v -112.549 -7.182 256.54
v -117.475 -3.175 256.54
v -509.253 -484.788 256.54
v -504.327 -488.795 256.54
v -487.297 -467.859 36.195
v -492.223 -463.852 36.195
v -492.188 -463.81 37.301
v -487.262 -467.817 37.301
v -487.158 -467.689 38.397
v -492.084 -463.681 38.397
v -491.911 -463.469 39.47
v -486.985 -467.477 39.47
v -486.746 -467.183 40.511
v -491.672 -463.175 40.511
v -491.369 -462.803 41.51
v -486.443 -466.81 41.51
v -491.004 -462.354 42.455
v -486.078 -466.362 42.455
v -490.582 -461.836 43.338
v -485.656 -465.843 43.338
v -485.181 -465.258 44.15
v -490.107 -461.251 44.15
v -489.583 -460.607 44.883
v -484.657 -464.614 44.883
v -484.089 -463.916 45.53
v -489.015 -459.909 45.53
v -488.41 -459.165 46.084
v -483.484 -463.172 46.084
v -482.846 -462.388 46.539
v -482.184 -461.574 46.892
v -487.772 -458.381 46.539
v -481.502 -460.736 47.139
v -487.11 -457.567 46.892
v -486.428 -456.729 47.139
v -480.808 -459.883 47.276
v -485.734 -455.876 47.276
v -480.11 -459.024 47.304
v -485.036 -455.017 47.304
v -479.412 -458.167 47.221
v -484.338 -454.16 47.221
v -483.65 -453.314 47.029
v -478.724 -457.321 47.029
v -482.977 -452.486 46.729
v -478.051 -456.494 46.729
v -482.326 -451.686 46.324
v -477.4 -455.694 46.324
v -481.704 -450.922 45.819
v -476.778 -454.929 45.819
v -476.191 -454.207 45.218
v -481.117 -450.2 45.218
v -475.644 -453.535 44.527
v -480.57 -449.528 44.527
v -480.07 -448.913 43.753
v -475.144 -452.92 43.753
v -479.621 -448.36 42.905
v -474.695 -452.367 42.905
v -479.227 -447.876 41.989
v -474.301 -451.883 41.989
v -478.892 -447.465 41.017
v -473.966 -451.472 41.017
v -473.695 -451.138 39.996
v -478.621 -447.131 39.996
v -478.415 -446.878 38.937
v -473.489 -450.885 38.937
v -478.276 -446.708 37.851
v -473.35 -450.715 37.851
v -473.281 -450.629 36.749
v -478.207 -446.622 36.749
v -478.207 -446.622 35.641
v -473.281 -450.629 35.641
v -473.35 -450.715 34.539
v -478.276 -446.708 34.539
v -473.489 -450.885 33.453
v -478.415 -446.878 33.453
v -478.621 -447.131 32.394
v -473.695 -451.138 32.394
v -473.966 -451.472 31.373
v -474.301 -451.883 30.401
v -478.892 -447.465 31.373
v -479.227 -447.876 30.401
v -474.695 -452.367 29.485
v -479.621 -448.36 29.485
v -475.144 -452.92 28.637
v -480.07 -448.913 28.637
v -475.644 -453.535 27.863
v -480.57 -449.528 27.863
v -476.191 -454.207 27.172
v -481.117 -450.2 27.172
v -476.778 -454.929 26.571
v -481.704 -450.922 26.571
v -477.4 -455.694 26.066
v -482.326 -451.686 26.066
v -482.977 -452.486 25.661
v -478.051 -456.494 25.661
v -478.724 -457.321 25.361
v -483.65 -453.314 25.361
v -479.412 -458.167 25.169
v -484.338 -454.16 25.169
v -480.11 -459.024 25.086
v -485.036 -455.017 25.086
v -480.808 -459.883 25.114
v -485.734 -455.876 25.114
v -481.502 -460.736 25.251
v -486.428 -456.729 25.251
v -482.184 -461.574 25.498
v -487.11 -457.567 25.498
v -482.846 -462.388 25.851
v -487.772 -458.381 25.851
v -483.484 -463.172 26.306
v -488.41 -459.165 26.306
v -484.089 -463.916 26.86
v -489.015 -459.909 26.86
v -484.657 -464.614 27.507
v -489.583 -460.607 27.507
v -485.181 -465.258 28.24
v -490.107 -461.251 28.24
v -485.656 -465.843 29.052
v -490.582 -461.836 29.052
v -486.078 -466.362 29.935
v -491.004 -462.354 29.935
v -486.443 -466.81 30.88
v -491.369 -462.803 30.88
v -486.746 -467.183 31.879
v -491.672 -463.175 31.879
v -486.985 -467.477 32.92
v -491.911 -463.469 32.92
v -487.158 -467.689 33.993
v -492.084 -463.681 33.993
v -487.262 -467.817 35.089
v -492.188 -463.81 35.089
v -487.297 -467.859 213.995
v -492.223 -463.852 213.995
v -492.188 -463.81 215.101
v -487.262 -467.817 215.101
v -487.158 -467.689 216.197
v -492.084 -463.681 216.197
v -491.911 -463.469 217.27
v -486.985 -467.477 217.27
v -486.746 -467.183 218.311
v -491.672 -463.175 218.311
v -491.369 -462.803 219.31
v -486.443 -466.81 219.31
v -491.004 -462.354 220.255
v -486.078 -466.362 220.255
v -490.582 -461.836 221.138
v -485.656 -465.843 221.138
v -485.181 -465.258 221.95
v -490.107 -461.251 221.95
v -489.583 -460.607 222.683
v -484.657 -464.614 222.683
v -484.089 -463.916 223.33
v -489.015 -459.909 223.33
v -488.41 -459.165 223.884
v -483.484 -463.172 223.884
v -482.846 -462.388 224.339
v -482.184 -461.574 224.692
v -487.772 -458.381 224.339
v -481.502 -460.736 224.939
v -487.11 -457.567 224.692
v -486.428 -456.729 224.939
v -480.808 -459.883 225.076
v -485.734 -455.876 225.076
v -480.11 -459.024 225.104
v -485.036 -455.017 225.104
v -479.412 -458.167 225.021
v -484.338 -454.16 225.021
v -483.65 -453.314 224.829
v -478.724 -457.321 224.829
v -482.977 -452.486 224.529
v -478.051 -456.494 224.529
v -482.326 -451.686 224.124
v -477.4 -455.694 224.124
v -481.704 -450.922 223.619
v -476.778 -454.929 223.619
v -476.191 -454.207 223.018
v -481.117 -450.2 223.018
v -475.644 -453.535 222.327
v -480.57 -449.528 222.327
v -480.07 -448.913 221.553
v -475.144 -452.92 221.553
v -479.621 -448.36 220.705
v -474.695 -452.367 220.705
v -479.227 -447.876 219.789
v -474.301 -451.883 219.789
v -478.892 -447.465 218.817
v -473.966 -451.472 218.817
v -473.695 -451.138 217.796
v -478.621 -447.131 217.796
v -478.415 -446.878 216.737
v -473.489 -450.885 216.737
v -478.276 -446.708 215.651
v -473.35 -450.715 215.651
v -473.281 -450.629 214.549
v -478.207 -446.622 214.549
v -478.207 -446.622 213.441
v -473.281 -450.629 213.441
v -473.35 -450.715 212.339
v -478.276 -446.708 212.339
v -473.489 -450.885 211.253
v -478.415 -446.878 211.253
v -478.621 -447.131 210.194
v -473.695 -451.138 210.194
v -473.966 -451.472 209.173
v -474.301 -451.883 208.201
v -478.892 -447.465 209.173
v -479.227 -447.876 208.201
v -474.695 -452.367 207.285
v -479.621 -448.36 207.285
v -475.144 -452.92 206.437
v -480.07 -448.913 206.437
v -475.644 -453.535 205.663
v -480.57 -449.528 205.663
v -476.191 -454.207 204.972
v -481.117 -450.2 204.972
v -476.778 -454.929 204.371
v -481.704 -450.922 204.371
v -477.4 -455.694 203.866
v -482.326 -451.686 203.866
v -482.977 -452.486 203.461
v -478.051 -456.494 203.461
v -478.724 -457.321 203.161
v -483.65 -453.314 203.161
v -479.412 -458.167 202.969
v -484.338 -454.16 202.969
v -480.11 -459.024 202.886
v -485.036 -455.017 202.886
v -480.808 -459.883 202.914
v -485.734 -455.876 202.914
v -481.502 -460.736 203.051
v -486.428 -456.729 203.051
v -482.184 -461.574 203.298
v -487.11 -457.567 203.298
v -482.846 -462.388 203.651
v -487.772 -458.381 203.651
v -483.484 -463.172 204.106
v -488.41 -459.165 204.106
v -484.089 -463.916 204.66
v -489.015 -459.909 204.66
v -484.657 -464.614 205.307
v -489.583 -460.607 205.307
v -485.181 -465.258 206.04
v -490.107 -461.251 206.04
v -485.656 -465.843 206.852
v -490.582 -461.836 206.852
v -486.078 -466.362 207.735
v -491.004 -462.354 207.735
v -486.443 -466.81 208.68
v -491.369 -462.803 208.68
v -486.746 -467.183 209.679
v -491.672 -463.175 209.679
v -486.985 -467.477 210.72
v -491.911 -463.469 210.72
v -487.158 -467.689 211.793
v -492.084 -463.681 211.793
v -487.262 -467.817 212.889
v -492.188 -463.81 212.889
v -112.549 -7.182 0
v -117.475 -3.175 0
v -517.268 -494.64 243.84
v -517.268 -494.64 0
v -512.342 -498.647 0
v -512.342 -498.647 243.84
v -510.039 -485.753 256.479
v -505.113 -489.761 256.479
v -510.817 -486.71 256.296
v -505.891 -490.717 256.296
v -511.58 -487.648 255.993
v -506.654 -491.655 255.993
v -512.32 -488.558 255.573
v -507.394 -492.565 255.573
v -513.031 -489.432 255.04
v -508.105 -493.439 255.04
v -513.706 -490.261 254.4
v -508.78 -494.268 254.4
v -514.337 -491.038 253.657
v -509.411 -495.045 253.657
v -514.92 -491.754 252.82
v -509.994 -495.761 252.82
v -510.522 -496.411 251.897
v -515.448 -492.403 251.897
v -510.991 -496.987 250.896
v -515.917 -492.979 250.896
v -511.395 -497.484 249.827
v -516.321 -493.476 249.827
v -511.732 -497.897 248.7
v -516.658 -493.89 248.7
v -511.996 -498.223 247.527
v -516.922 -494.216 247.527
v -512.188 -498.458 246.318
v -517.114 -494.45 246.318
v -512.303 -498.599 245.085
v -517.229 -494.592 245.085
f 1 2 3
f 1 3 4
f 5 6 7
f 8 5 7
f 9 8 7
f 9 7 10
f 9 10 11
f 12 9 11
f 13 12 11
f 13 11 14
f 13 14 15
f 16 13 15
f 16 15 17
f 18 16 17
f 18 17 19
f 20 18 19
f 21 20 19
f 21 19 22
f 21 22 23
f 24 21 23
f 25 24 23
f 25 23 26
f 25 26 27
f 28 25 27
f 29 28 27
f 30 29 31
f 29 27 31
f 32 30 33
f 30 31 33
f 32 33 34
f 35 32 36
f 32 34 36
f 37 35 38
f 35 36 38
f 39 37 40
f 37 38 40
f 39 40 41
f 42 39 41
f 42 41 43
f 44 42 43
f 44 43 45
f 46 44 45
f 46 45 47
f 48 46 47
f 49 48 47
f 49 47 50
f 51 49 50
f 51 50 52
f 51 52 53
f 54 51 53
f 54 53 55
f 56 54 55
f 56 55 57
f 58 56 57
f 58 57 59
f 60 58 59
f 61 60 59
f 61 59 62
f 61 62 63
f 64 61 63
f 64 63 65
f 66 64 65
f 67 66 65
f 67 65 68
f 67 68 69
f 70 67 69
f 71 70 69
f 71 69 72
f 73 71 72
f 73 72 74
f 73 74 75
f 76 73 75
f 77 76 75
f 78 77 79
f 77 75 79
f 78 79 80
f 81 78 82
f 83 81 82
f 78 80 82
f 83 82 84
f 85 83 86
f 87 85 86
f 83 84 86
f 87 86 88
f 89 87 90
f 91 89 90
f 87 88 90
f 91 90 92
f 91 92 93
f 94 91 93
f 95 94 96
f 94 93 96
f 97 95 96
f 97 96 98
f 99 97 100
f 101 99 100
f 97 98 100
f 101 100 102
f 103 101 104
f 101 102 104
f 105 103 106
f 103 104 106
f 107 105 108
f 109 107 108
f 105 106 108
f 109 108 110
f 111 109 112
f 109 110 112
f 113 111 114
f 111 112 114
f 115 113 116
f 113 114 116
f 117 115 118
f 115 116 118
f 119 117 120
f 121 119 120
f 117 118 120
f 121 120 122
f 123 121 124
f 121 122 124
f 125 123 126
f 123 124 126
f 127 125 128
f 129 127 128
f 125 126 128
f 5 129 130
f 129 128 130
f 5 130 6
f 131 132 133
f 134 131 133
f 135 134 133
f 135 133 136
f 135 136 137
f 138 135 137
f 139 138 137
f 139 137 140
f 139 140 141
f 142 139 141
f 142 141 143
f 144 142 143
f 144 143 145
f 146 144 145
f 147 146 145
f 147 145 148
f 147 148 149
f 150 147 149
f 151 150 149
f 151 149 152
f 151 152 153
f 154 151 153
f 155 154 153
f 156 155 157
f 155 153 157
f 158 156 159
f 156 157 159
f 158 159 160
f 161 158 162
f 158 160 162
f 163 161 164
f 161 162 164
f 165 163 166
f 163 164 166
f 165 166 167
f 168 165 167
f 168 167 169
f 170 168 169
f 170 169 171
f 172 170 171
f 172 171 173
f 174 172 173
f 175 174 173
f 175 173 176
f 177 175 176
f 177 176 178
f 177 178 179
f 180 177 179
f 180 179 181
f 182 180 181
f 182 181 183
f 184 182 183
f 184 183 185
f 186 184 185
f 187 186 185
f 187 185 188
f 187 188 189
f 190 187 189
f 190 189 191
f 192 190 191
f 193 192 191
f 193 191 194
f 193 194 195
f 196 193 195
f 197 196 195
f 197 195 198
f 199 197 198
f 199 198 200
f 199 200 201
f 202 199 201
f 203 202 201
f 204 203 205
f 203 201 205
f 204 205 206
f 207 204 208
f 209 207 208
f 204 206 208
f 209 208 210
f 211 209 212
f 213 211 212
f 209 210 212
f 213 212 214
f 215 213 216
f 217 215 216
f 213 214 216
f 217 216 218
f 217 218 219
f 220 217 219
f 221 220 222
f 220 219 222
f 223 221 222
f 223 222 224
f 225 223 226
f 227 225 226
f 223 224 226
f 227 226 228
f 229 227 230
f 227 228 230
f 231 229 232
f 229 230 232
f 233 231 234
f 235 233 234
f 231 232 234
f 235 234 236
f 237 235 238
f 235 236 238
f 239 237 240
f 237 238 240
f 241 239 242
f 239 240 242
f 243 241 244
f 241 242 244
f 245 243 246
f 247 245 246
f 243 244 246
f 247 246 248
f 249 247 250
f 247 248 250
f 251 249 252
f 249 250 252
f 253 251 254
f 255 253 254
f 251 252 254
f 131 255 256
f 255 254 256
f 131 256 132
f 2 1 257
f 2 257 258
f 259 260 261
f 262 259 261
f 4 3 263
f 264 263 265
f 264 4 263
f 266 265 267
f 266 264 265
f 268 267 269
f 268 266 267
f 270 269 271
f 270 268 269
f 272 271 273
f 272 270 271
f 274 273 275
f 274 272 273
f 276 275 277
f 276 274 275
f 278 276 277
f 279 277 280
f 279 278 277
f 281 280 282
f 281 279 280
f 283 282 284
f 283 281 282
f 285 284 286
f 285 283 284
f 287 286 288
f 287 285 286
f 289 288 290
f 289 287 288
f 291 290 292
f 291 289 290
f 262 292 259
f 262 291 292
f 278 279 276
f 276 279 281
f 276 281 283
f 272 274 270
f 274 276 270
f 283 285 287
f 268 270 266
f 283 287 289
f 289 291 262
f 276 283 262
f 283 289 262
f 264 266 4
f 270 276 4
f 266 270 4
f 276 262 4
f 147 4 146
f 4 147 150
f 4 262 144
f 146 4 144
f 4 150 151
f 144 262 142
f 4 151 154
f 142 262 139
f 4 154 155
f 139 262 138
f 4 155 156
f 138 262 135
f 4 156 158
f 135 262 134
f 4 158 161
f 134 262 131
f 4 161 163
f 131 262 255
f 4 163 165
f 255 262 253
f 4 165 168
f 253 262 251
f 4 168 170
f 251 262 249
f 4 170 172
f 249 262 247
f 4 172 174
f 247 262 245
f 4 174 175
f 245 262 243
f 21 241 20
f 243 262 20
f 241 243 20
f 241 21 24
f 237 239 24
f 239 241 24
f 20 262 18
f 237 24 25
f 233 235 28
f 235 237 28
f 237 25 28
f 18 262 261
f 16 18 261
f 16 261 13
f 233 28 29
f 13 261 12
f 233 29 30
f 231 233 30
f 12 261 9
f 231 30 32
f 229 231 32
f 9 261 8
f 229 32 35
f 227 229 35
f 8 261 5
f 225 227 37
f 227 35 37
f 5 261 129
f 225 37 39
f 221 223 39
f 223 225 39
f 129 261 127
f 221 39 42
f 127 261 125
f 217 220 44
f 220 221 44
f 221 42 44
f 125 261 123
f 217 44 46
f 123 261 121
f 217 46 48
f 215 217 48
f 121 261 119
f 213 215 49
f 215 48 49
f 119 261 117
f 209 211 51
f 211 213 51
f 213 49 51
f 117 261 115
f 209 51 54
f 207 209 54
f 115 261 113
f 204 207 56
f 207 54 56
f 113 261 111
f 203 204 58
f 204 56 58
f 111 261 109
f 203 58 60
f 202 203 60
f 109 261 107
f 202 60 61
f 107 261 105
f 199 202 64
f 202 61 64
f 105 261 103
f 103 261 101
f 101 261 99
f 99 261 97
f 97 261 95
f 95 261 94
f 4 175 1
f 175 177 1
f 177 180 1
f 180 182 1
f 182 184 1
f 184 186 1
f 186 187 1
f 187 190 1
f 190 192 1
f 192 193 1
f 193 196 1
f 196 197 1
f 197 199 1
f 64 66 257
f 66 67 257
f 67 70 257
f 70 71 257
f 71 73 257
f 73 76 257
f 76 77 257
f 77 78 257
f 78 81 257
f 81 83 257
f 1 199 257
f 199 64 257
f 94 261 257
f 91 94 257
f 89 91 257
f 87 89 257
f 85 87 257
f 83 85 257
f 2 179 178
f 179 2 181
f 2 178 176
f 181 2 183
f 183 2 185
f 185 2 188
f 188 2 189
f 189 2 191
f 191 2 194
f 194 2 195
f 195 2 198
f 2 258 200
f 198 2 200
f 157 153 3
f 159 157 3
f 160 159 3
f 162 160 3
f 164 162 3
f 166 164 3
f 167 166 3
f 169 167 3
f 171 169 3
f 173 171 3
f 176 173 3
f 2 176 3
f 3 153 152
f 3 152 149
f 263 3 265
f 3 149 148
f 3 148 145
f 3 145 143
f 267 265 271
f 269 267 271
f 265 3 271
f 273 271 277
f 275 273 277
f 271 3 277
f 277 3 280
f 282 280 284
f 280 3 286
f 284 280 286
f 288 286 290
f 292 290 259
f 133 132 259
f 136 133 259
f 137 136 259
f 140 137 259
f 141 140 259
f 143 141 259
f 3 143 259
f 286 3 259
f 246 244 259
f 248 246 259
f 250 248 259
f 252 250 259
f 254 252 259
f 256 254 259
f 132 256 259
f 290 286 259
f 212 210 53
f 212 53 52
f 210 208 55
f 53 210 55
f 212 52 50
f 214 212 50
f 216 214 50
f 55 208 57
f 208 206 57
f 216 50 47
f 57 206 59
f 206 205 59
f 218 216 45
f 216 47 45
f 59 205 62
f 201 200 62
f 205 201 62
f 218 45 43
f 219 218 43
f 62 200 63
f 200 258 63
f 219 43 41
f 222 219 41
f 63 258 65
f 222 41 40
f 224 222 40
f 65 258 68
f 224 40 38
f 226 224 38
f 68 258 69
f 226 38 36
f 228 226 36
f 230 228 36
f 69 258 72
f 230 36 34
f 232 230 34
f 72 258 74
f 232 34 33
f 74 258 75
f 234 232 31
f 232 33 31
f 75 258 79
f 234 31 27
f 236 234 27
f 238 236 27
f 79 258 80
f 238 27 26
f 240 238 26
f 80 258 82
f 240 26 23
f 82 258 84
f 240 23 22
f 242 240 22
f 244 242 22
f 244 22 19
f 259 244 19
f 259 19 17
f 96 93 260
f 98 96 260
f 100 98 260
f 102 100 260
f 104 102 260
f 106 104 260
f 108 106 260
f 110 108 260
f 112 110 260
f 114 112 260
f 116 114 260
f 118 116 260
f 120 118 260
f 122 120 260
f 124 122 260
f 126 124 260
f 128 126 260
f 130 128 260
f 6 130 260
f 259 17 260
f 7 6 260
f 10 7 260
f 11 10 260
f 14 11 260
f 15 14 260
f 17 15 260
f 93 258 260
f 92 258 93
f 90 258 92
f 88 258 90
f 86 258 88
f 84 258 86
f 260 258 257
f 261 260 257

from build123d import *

# Parameters (mm, degrees)
BOSS_EXTRUDE1_DEPTH = 256.54
CUT_EXTRUDE1_REACH  = 759.98
SKETCH2_R           = 11.1125
FILLET1_R           = 12.7


with BuildPart() as part:
    # Sketch1 → Boss-Extrude1 (new body)
    with BuildSketch(Plane.XY):
        Polygon((-112.549019073, -7.182145107), (-117.475, -3.175), (-517.267555835, -494.639734243), (-512.341574908, -498.646879349), align=None)
    extrude(amount=BOSS_EXTRUDE1_DEPTH)

    # Sketch2 → Cut-Extrude1 (cut, up to next)
    with BuildSketch(Plane(origin=(-69.139884972, 56.243326117, 0), x_dir=(0, 0, 1), z_dir=(-0.77574502790219, 0.6310464734748387, 0)), mode=Mode.PRIVATE) as cut_extrude1_sk1:
        with Locations(Location((36.195, -659.334181394, 0), (0, 0, 270))):
            Circle(SKETCH2_R)
    cut_extrude1_tool1 = extrude(cut_extrude1_sk1.sketch, amount=-CUT_EXTRUDE1_REACH, mode=Mode.PRIVATE) & part.part
    # Sketch2 → Cut-Extrude1 (cut, up to next)
    with BuildSketch(Plane(origin=(-69.139884972, 56.243326117, 0), x_dir=(0, 0, 1), z_dir=(-0.77574502790219, 0.6310464734748387, 0)), mode=Mode.PRIVATE) as cut_extrude1_sk2:
        with Locations(Location((213.995, -659.334181394, 0), (0, 0, 270))):
            Circle(SKETCH2_R)
    cut_extrude1_tool2 = extrude(cut_extrude1_sk2.sketch, amount=-CUT_EXTRUDE1_REACH, mode=Mode.PRIVATE) & part.part
    add(cut_extrude1_tool1.solids().sort_by_distance((-485.210395, -455.231887, 36.195))[0], mode=Mode.SUBTRACT)
    add(cut_extrude1_tool2.solids().sort_by_distance((-485.210395, -455.231887, 213.995))[0], mode=Mode.SUBTRACT)

    # Fillet1
    fillet1_edges = [part.edges().sort_by_distance(p)[0] for p in [
        (-514.804565371, -496.643306796, 256.54),
    ]]
    fillet(fillet1_edges, radius=FILLET1_R)


solid = part.part
